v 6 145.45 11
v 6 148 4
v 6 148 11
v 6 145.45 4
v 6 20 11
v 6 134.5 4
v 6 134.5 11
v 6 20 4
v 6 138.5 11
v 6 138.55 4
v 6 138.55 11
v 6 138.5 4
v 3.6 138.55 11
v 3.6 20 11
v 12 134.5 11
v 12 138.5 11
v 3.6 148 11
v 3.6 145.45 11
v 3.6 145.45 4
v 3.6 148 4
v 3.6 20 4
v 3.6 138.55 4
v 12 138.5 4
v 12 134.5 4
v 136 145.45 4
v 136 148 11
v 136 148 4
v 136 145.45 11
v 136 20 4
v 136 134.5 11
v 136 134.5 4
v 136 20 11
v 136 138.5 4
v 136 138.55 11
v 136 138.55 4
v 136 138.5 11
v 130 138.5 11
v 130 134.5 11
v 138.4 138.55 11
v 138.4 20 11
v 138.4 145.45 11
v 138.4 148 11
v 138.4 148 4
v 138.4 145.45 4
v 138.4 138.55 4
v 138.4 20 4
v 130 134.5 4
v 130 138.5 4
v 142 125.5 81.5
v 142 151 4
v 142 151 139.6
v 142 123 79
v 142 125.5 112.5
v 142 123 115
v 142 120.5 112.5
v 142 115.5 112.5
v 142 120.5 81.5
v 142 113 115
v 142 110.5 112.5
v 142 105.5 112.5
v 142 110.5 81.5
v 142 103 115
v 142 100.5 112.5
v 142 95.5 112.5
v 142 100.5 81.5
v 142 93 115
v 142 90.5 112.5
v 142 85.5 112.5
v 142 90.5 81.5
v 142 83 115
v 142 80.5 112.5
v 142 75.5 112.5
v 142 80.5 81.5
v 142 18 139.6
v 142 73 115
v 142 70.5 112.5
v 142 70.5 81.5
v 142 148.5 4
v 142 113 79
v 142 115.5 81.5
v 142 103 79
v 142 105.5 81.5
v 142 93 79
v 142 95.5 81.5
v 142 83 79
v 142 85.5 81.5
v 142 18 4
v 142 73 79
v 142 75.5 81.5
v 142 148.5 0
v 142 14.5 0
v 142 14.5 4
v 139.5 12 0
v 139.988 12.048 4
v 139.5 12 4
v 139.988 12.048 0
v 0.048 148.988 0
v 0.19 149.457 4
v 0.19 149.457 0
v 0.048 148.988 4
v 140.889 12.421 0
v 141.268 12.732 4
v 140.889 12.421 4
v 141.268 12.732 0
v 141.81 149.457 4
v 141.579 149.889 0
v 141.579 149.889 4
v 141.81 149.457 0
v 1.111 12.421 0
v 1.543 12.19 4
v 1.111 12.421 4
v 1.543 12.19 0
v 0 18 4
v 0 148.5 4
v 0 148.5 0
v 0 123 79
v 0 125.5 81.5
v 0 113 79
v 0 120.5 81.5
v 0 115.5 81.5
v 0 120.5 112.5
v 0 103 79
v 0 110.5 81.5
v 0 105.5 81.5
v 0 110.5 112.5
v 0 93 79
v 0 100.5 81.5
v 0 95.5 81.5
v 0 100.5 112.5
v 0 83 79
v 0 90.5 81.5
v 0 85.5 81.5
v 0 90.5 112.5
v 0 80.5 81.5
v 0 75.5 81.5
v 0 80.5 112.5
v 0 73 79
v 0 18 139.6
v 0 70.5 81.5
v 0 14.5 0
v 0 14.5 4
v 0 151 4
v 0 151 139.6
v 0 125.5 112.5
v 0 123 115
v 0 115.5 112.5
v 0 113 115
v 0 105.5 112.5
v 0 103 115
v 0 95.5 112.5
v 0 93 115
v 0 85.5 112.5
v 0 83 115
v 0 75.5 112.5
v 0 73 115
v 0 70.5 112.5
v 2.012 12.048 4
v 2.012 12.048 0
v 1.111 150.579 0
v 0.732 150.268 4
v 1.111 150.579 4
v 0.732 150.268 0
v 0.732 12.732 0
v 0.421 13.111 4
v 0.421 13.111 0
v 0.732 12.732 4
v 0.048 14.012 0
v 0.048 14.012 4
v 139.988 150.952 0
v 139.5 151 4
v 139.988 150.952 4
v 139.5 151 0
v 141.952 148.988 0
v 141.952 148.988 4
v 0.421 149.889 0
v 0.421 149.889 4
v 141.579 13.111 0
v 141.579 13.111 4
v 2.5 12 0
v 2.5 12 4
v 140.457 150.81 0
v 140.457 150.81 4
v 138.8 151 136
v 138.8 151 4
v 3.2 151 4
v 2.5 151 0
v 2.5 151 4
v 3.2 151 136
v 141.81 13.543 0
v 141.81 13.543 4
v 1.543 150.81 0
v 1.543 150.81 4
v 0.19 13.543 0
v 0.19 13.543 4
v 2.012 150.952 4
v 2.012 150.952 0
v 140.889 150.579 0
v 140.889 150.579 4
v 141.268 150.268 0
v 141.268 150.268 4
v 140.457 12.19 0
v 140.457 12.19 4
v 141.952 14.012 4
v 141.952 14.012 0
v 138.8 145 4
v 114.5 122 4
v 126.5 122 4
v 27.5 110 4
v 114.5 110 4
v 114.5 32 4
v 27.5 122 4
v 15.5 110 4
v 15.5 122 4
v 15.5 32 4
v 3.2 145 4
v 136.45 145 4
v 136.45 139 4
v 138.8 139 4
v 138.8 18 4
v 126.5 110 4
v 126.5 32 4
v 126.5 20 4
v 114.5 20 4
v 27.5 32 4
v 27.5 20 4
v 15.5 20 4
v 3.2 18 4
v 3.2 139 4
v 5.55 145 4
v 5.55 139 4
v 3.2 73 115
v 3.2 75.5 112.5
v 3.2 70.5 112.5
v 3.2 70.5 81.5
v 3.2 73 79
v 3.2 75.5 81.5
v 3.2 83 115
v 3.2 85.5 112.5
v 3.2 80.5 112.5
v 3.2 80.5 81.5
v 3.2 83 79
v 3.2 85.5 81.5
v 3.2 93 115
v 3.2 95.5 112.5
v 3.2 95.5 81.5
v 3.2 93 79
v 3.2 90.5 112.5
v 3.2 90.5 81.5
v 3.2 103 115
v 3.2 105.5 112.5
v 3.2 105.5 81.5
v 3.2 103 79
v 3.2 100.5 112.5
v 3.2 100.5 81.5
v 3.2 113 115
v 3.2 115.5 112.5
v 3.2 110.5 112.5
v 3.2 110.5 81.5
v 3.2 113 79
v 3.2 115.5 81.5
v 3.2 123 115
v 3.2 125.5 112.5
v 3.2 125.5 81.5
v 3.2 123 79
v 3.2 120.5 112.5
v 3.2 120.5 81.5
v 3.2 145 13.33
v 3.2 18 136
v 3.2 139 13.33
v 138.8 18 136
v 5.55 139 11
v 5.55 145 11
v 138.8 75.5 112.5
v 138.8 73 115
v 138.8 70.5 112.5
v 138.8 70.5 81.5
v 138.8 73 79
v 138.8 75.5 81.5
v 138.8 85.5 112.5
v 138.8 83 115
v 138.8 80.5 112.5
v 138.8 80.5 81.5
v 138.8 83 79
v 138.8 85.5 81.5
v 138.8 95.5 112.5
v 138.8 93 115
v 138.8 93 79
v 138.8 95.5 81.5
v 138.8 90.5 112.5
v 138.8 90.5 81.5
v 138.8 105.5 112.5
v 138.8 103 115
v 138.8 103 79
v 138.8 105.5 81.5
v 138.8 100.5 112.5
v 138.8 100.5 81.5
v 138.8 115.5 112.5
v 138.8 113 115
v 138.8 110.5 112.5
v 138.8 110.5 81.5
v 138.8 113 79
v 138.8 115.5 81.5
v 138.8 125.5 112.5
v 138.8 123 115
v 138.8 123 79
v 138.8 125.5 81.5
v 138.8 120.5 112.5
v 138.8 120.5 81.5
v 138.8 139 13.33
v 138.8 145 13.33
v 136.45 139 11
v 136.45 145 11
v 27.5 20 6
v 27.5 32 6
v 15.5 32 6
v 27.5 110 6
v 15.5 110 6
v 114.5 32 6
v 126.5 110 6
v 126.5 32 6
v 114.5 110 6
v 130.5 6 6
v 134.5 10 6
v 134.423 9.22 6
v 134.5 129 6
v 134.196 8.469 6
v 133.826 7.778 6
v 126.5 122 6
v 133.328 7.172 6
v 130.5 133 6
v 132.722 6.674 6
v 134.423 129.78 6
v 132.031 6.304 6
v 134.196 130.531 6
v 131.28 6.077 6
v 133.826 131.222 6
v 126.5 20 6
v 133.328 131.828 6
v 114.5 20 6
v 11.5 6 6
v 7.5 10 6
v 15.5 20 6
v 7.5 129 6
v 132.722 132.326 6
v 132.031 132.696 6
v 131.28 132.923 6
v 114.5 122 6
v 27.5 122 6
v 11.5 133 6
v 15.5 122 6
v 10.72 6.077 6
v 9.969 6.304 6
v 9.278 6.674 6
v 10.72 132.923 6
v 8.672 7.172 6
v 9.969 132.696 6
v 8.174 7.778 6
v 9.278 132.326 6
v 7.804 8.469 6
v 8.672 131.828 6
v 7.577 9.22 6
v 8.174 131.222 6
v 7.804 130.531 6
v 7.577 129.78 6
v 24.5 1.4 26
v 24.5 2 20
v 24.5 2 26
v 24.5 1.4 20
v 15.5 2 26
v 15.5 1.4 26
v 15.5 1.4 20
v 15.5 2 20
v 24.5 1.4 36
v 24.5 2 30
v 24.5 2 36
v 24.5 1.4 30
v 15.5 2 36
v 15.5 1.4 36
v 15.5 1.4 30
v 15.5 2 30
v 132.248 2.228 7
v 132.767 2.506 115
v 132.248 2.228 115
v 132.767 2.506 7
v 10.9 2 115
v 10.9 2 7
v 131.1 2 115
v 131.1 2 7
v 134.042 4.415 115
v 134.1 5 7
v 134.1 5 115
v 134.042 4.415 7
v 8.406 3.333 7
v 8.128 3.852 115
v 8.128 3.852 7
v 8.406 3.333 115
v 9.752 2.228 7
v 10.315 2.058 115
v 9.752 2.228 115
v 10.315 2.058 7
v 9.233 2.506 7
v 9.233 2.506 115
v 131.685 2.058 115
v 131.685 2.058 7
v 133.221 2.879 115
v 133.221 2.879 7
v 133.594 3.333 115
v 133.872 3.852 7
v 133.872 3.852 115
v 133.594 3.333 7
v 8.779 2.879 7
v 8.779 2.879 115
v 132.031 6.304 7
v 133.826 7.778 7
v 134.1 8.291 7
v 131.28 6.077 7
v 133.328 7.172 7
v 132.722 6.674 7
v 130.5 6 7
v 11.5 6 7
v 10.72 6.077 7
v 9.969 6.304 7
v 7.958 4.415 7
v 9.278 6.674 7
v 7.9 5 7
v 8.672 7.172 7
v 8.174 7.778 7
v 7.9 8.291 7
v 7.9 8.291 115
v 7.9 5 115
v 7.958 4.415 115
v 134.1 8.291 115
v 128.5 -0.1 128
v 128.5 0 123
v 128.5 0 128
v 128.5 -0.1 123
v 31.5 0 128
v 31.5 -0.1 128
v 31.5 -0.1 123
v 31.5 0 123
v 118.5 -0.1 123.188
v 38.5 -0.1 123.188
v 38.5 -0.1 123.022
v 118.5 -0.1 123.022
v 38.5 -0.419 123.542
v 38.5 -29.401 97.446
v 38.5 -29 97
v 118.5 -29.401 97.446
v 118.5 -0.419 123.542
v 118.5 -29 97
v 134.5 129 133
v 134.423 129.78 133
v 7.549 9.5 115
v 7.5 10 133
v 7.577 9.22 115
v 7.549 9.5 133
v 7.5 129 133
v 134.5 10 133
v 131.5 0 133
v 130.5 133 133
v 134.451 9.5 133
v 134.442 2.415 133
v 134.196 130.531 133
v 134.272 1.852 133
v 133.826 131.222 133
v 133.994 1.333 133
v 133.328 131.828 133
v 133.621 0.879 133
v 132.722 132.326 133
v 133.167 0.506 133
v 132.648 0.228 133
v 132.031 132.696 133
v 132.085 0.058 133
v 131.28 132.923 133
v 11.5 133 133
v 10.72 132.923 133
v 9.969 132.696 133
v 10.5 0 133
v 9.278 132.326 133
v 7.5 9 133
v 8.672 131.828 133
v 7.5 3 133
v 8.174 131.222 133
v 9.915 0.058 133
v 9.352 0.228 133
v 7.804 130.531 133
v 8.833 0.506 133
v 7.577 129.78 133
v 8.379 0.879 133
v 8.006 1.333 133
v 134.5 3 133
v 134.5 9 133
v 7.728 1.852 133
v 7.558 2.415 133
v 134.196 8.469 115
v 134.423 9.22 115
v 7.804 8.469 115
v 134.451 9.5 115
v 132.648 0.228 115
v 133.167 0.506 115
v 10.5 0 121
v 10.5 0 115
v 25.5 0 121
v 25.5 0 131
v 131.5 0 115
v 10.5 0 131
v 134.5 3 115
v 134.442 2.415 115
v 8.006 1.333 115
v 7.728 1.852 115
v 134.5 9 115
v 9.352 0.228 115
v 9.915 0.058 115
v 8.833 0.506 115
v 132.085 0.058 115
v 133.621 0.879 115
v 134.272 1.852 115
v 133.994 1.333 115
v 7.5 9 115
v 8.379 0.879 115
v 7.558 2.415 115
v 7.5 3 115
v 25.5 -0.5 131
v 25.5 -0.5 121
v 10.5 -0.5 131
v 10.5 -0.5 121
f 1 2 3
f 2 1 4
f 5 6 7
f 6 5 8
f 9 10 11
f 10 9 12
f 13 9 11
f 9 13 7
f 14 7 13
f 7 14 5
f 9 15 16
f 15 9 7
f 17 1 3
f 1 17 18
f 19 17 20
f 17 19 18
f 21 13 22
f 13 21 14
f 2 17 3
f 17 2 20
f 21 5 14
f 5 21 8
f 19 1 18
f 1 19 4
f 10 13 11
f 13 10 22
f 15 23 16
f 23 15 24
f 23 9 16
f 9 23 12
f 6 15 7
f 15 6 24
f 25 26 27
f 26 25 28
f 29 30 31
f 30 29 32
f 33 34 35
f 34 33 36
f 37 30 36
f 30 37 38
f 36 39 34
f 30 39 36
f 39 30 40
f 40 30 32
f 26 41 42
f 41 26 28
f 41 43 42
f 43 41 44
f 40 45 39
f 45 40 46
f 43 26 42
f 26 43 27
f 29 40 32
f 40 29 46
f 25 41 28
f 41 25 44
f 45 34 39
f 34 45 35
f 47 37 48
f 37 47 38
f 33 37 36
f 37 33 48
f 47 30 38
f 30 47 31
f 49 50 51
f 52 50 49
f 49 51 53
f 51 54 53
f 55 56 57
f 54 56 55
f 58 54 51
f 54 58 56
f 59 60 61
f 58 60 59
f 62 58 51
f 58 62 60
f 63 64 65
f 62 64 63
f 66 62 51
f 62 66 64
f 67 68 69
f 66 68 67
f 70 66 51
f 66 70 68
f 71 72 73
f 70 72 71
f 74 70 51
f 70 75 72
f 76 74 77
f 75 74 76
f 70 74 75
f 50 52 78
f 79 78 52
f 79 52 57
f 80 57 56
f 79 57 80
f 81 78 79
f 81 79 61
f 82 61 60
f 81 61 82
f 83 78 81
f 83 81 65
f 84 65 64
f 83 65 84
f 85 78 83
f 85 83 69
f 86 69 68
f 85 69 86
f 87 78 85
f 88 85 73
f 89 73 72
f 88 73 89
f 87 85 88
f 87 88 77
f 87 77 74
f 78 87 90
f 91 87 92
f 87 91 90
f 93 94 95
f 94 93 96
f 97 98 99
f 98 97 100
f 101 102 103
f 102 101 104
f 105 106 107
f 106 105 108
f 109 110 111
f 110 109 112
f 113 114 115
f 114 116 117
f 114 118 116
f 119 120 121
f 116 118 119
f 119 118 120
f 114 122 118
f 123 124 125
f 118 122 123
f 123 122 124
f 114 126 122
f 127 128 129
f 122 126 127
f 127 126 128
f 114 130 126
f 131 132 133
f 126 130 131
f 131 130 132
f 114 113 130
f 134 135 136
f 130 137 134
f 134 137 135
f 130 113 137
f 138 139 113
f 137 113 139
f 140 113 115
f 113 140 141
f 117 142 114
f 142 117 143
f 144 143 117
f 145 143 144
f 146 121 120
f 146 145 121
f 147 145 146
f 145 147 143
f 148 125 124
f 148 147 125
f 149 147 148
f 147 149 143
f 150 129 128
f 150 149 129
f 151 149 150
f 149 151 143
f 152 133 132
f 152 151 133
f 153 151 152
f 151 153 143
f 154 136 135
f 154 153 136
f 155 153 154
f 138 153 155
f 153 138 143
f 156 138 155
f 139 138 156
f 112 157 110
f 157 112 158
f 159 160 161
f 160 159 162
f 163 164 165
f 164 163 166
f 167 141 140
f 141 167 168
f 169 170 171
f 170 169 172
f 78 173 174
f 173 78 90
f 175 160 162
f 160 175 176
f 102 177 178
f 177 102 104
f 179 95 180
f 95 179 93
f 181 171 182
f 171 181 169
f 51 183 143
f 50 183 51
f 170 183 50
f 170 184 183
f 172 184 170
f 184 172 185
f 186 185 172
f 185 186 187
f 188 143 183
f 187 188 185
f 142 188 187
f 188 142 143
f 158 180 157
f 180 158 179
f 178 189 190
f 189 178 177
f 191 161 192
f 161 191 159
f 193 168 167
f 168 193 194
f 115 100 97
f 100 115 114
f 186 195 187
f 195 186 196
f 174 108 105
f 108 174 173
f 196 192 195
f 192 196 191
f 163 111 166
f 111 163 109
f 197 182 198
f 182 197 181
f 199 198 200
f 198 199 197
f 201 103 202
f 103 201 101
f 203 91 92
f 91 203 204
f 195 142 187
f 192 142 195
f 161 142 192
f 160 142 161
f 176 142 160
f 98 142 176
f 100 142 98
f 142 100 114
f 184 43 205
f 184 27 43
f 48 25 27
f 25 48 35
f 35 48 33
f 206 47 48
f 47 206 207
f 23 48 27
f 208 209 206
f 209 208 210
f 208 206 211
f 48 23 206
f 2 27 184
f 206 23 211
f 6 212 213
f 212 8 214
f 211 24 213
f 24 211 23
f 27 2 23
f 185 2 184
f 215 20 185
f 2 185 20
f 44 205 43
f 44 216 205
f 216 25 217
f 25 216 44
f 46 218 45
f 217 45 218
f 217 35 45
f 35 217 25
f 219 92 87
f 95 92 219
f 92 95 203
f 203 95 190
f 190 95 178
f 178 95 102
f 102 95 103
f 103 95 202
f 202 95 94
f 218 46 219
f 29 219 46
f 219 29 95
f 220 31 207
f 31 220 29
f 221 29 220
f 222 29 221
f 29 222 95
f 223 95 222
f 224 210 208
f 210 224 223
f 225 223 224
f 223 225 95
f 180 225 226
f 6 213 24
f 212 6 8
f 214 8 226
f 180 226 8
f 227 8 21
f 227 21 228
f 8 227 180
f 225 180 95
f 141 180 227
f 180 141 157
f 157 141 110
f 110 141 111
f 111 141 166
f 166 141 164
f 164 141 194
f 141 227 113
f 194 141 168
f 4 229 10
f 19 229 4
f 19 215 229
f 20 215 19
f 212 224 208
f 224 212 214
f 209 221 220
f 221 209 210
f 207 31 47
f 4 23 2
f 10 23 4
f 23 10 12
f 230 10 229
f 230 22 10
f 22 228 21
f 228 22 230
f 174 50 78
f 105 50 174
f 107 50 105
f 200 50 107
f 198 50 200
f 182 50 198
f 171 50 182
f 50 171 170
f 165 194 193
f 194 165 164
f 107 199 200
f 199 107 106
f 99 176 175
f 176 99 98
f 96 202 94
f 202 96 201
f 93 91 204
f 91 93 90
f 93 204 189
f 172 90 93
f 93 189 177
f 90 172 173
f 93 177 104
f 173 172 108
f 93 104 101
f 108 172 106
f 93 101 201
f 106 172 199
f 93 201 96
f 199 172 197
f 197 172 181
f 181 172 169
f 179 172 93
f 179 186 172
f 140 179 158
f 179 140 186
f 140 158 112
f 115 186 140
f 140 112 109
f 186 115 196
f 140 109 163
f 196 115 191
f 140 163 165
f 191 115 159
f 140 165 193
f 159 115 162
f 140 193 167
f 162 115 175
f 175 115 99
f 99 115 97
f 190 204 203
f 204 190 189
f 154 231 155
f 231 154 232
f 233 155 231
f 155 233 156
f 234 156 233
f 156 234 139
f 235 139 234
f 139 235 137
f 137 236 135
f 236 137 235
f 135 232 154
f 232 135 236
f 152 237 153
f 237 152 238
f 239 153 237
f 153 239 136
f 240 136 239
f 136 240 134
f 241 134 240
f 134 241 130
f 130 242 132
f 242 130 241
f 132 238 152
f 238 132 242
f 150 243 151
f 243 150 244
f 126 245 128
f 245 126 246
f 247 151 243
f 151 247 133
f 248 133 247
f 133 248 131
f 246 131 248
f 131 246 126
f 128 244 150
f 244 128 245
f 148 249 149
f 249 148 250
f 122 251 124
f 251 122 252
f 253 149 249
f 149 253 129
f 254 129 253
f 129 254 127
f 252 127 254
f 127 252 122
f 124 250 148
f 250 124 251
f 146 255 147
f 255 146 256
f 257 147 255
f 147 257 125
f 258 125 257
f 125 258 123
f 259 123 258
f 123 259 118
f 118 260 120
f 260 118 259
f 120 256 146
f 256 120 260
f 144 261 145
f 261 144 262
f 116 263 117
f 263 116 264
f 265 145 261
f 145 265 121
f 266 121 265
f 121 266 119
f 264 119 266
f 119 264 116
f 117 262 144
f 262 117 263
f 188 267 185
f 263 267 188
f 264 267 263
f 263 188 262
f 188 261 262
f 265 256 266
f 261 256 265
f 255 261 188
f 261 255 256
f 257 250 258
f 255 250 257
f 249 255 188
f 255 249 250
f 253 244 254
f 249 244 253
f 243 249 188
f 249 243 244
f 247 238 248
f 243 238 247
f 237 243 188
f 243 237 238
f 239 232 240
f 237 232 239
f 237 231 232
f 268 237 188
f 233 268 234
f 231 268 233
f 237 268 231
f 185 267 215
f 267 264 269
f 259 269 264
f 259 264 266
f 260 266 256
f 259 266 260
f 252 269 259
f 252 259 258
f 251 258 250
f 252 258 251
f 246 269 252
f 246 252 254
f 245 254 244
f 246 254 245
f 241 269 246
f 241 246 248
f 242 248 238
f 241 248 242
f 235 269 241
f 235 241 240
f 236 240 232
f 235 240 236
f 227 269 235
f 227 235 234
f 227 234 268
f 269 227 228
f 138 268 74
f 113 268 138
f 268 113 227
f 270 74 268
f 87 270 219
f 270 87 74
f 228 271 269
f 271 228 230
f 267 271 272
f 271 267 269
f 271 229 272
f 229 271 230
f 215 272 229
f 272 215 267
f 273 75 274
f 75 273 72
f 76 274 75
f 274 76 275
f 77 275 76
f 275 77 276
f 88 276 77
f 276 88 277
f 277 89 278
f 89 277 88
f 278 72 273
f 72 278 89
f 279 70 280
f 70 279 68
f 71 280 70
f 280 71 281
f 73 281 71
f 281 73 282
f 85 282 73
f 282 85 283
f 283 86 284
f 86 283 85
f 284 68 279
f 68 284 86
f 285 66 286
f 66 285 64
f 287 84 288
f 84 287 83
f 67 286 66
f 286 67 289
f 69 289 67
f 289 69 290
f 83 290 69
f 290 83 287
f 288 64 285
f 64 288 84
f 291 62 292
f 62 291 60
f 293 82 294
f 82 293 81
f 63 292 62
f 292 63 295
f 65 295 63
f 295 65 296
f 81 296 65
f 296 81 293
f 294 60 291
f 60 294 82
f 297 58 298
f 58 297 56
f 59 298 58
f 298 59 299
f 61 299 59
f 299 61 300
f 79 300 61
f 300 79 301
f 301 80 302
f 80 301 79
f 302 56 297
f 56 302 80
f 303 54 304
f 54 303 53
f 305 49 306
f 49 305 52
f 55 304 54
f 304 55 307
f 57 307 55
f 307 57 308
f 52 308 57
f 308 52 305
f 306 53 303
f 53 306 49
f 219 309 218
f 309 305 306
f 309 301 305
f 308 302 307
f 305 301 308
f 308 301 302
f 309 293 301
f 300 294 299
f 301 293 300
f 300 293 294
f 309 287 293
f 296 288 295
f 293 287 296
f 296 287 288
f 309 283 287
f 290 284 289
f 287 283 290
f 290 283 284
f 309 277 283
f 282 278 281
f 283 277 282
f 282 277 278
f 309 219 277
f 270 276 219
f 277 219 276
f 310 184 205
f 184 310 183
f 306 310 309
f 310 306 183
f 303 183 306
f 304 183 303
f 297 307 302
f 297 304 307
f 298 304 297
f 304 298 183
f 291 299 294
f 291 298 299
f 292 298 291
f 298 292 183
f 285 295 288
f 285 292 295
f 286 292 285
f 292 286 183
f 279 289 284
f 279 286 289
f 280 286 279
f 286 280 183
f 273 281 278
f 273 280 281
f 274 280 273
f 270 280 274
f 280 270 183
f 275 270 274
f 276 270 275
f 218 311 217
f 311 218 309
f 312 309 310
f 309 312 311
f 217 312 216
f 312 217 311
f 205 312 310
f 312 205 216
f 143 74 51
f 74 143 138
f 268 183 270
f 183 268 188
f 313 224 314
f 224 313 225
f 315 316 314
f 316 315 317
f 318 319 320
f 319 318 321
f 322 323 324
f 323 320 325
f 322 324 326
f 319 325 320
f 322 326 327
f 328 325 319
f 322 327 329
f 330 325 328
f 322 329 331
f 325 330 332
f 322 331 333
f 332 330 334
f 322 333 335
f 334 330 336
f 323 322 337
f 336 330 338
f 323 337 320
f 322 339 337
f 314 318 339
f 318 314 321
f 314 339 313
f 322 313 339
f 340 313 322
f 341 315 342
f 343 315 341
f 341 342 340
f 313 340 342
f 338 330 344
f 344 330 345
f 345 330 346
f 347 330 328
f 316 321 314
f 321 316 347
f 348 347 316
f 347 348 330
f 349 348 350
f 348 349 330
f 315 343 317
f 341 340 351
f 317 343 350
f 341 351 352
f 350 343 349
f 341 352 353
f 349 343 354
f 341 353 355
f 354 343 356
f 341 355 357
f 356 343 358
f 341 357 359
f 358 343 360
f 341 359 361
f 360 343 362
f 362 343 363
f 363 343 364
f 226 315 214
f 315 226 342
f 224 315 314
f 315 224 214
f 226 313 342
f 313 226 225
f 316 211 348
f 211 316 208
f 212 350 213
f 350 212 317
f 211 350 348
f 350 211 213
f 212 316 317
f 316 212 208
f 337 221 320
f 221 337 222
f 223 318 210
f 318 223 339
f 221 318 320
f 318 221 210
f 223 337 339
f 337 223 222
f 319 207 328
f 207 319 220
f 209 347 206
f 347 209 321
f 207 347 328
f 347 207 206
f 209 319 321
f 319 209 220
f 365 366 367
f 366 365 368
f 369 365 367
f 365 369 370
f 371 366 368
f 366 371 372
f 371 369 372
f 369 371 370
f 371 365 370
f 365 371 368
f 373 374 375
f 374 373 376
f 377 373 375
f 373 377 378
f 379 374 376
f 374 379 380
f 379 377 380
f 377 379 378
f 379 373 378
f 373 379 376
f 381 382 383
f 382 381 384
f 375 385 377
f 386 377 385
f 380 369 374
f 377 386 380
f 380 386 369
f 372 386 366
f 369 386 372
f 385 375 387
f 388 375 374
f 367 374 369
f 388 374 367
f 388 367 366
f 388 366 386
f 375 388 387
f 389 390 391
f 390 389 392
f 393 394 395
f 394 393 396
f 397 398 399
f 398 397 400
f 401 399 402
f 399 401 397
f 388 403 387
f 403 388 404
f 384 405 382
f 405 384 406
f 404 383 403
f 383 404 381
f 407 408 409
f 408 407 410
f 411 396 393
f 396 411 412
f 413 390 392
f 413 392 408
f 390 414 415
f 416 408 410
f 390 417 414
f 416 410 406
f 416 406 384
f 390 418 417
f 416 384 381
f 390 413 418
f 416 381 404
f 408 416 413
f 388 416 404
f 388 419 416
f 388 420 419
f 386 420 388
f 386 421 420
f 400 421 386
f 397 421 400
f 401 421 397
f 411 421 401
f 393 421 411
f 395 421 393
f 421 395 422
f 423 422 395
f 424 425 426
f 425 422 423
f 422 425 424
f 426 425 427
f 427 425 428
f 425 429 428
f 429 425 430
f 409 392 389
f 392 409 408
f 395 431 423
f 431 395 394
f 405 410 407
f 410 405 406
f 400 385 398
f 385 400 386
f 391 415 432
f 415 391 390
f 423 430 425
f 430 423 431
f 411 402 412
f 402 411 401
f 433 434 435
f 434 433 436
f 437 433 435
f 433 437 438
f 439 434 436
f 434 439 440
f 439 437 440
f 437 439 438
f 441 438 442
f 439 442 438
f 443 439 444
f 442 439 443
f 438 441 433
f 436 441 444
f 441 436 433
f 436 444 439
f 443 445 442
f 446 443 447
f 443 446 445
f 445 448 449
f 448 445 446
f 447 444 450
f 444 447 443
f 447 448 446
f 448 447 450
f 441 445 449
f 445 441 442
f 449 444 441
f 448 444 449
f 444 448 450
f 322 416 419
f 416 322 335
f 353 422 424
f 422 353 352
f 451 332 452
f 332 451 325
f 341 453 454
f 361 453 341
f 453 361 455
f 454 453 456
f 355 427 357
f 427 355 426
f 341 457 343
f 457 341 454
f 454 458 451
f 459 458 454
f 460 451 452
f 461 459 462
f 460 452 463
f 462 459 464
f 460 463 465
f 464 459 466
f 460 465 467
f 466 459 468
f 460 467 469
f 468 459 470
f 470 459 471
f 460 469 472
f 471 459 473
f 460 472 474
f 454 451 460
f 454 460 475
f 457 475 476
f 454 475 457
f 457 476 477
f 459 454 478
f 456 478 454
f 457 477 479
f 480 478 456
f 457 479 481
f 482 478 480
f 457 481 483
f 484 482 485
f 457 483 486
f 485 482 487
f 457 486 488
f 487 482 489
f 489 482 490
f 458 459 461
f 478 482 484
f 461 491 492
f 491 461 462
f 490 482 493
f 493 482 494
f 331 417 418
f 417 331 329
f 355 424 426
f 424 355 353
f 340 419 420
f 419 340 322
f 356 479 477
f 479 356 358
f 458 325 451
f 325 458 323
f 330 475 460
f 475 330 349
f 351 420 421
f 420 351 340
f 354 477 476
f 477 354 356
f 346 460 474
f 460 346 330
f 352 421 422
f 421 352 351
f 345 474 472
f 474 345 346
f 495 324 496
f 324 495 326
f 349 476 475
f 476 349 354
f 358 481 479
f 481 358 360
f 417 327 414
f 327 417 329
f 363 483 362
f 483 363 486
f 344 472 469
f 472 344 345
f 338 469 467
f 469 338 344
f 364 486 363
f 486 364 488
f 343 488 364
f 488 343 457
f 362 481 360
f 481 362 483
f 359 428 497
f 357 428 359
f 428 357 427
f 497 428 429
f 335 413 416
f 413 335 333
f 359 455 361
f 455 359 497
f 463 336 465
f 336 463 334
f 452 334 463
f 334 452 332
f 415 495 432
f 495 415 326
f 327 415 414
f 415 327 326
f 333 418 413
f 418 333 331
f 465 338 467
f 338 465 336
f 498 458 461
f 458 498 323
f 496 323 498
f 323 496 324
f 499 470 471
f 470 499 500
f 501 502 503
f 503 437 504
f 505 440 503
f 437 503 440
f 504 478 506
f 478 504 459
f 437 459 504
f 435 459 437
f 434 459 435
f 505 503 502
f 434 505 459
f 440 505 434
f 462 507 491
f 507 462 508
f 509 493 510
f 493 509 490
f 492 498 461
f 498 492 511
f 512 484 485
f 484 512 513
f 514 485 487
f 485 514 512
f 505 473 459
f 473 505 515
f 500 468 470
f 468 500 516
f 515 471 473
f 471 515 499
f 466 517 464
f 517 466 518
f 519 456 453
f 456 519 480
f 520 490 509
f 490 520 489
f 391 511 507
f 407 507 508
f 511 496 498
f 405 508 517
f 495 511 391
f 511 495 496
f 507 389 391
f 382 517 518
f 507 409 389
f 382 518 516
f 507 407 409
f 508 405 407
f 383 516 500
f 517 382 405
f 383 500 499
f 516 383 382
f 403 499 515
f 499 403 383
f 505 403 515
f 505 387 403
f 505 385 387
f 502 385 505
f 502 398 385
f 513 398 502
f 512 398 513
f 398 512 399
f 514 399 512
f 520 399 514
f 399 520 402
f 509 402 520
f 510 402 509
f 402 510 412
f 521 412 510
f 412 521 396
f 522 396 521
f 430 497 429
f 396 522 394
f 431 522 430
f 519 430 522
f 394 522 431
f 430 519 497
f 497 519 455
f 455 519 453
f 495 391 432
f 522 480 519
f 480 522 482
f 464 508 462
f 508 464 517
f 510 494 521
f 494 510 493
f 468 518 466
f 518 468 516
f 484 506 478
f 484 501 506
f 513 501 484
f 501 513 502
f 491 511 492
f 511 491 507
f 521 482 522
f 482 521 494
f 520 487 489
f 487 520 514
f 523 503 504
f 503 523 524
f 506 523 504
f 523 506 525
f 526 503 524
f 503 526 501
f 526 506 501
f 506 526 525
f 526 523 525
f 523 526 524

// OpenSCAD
// Epson TM-m30 (original), in the factory front-eject configuration.
// X is left to right, Y is front to back, Z is up in assembly coordinates.
part = "assembly"; // [assembly,base,hood,empty,service]
printer_w = 127;
printer_d = 133;
printer_h = 129;
side_clearance = 1.5; // Per side, including at the base guides.
top_clearance = 3;

width = printer_w + 2 * side_clearance + 12;
depth = printer_d + 18; // Extra space behind the nominal printer back.
base_front = 12; // Measured from the foremost point of the closed cover.
hood_front = 18;
floor_t = 4;
roof_t = 3.6;
wall = 3.2;
guide_outer = wall + 0.4;
guide_inner = 6;
guide_h = 7;
rear_stop = printer_d + 1.5;
key_y = depth - 12;
key_d = 6;
key_clearance = 0.45;
roof_z = floor_t + printer_h + top_clearance;
height = roof_z + roof_t;
eps = 0.02;
$fn = 32;

module rounded_plan(w, d, r) {
    translate([r, r]) offset(r = r) square([w - 2*r, d - 2*r]);
}

module base_guide() {
    // The gap captures the key when the hood is lowered vertically.
    difference() {
        translate([guide_outer, hood_front + 2, floor_t - eps])
            cube([guide_inner - guide_outer, depth - hood_front - 5, guide_h + eps]);
        translate([guide_outer - eps, key_y - key_clearance, floor_t - 2*eps])
            cube([guide_inner - guide_outer + 2*eps,
                  key_d + 2*key_clearance, guide_h + 3*eps]);
    }
    // Small stops at the rear corners leave the center clear for wiring.
    translate([guide_outer, rear_stop, floor_t - eps])
        cube([12 - guide_outer, 4, guide_h + eps]);
}

module base() {
    translate([0, base_front, 0])
        linear_extrude(floor_t)
            rounded_plan(width, depth - base_front, 2.5);
    base_guide();
    translate([width, 0, 0]) mirror([1,0,0]) base_guide();
}

module side_vent(y, z) {
    // Both ends are pointed so the openings close at 45 degrees in print.
    translate([-eps, y, z]) rotate([90,0,90])
        linear_extrude(wall + 2*eps)
            polygon([[0,0], [2.5,2.5], [2.5,33.5],
                     [0,36], [-2.5,33.5], [-2.5,2.5]]);
}

module hood_wall() {
    difference() {
        translate([0, hood_front, floor_t])
            cube([wall, depth - hood_front, roof_z - floor_t + eps]);
        for (y = [depth - 78 : 10 : depth - 28]) side_vent(y, 79);
    }
    // A ramp grows inwards from the wall in the upside-down print orientation.
    translate([0, key_y + key_d, floor_t]) rotate([90,0,0])
        linear_extrude(key_d)
            polygon([[wall - eps,0], [guide_inner - key_clearance,0],
                     [guide_inner - key_clearance,guide_h],
                     [wall - eps,guide_h + guide_inner - key_clearance - wall]]);
}

module hood() {
    translate([0, hood_front, roof_z])
        cube([width, depth - hood_front, roof_t]);
    hood_wall();
    translate([width,0,0]) mirror([1,0,0]) hood_wall();
}

// Illustration of the printer front and paper path. Export only base and hood.
module printer_mock(open = false) {
    x = (width - printer_w) / 2;
    color("#292c30")
        translate([x,6,floor_t + 2])
            linear_extrude(printer_h - 2)
                rounded_plan(printer_w, printer_d - 6, 4);
    for (side = [x + 8, x + printer_w - 20], y = [20,110])
        color("#25272a") translate([side,y,floor_t]) cube([12,12,2]);
    color("#3c4148")
        translate([x,0,floor_t + printer_h - 18])
            linear_extrude(18)
                rounded_plan(printer_w, 12, 3);
    if (open) {
        color("#454a51") translate([x,-97,floor_t + 2])
            linear_extrude(7) rounded_plan(printer_w,105,4);
        color("#f0e8d5") translate([x+23,-52,floor_t + 27]) rotate([0,90,0])
            cylinder(r = 22, h = 80);
    } else {
        color("#454a51") translate([x+0.4,2,floor_t+3])
            linear_extrude(printer_h-20) rounded_plan(printer_w-0.8,10,3);
        color("#15191c") translate([x+24,-0.1,floor_t+printer_h-10])
            cube([97,0.6,5]);
        color("#f5edda") translate([x+31,-29,floor_t+printer_h-36])
            rotate([42,0,0]) cube([80,39,0.6]);
        for (z = [16,26])
            color("#767e87") translate([x+8,1.4,floor_t+z]) cube([9,1,6]);
    }
    color("#717a84") translate([x+3,-0.5,floor_t+printer_h-12])
        cube([15,1,10]);
}

if (part == "base") translate([0,-base_front,0]) base();
else if (part == "hood") translate([0,depth,height]) rotate([180,0,0]) hood();
else {
    color("#637783") base();
    color("#8497a3") hood();
    if (part != "empty") printer_mock(part == "service");
}
